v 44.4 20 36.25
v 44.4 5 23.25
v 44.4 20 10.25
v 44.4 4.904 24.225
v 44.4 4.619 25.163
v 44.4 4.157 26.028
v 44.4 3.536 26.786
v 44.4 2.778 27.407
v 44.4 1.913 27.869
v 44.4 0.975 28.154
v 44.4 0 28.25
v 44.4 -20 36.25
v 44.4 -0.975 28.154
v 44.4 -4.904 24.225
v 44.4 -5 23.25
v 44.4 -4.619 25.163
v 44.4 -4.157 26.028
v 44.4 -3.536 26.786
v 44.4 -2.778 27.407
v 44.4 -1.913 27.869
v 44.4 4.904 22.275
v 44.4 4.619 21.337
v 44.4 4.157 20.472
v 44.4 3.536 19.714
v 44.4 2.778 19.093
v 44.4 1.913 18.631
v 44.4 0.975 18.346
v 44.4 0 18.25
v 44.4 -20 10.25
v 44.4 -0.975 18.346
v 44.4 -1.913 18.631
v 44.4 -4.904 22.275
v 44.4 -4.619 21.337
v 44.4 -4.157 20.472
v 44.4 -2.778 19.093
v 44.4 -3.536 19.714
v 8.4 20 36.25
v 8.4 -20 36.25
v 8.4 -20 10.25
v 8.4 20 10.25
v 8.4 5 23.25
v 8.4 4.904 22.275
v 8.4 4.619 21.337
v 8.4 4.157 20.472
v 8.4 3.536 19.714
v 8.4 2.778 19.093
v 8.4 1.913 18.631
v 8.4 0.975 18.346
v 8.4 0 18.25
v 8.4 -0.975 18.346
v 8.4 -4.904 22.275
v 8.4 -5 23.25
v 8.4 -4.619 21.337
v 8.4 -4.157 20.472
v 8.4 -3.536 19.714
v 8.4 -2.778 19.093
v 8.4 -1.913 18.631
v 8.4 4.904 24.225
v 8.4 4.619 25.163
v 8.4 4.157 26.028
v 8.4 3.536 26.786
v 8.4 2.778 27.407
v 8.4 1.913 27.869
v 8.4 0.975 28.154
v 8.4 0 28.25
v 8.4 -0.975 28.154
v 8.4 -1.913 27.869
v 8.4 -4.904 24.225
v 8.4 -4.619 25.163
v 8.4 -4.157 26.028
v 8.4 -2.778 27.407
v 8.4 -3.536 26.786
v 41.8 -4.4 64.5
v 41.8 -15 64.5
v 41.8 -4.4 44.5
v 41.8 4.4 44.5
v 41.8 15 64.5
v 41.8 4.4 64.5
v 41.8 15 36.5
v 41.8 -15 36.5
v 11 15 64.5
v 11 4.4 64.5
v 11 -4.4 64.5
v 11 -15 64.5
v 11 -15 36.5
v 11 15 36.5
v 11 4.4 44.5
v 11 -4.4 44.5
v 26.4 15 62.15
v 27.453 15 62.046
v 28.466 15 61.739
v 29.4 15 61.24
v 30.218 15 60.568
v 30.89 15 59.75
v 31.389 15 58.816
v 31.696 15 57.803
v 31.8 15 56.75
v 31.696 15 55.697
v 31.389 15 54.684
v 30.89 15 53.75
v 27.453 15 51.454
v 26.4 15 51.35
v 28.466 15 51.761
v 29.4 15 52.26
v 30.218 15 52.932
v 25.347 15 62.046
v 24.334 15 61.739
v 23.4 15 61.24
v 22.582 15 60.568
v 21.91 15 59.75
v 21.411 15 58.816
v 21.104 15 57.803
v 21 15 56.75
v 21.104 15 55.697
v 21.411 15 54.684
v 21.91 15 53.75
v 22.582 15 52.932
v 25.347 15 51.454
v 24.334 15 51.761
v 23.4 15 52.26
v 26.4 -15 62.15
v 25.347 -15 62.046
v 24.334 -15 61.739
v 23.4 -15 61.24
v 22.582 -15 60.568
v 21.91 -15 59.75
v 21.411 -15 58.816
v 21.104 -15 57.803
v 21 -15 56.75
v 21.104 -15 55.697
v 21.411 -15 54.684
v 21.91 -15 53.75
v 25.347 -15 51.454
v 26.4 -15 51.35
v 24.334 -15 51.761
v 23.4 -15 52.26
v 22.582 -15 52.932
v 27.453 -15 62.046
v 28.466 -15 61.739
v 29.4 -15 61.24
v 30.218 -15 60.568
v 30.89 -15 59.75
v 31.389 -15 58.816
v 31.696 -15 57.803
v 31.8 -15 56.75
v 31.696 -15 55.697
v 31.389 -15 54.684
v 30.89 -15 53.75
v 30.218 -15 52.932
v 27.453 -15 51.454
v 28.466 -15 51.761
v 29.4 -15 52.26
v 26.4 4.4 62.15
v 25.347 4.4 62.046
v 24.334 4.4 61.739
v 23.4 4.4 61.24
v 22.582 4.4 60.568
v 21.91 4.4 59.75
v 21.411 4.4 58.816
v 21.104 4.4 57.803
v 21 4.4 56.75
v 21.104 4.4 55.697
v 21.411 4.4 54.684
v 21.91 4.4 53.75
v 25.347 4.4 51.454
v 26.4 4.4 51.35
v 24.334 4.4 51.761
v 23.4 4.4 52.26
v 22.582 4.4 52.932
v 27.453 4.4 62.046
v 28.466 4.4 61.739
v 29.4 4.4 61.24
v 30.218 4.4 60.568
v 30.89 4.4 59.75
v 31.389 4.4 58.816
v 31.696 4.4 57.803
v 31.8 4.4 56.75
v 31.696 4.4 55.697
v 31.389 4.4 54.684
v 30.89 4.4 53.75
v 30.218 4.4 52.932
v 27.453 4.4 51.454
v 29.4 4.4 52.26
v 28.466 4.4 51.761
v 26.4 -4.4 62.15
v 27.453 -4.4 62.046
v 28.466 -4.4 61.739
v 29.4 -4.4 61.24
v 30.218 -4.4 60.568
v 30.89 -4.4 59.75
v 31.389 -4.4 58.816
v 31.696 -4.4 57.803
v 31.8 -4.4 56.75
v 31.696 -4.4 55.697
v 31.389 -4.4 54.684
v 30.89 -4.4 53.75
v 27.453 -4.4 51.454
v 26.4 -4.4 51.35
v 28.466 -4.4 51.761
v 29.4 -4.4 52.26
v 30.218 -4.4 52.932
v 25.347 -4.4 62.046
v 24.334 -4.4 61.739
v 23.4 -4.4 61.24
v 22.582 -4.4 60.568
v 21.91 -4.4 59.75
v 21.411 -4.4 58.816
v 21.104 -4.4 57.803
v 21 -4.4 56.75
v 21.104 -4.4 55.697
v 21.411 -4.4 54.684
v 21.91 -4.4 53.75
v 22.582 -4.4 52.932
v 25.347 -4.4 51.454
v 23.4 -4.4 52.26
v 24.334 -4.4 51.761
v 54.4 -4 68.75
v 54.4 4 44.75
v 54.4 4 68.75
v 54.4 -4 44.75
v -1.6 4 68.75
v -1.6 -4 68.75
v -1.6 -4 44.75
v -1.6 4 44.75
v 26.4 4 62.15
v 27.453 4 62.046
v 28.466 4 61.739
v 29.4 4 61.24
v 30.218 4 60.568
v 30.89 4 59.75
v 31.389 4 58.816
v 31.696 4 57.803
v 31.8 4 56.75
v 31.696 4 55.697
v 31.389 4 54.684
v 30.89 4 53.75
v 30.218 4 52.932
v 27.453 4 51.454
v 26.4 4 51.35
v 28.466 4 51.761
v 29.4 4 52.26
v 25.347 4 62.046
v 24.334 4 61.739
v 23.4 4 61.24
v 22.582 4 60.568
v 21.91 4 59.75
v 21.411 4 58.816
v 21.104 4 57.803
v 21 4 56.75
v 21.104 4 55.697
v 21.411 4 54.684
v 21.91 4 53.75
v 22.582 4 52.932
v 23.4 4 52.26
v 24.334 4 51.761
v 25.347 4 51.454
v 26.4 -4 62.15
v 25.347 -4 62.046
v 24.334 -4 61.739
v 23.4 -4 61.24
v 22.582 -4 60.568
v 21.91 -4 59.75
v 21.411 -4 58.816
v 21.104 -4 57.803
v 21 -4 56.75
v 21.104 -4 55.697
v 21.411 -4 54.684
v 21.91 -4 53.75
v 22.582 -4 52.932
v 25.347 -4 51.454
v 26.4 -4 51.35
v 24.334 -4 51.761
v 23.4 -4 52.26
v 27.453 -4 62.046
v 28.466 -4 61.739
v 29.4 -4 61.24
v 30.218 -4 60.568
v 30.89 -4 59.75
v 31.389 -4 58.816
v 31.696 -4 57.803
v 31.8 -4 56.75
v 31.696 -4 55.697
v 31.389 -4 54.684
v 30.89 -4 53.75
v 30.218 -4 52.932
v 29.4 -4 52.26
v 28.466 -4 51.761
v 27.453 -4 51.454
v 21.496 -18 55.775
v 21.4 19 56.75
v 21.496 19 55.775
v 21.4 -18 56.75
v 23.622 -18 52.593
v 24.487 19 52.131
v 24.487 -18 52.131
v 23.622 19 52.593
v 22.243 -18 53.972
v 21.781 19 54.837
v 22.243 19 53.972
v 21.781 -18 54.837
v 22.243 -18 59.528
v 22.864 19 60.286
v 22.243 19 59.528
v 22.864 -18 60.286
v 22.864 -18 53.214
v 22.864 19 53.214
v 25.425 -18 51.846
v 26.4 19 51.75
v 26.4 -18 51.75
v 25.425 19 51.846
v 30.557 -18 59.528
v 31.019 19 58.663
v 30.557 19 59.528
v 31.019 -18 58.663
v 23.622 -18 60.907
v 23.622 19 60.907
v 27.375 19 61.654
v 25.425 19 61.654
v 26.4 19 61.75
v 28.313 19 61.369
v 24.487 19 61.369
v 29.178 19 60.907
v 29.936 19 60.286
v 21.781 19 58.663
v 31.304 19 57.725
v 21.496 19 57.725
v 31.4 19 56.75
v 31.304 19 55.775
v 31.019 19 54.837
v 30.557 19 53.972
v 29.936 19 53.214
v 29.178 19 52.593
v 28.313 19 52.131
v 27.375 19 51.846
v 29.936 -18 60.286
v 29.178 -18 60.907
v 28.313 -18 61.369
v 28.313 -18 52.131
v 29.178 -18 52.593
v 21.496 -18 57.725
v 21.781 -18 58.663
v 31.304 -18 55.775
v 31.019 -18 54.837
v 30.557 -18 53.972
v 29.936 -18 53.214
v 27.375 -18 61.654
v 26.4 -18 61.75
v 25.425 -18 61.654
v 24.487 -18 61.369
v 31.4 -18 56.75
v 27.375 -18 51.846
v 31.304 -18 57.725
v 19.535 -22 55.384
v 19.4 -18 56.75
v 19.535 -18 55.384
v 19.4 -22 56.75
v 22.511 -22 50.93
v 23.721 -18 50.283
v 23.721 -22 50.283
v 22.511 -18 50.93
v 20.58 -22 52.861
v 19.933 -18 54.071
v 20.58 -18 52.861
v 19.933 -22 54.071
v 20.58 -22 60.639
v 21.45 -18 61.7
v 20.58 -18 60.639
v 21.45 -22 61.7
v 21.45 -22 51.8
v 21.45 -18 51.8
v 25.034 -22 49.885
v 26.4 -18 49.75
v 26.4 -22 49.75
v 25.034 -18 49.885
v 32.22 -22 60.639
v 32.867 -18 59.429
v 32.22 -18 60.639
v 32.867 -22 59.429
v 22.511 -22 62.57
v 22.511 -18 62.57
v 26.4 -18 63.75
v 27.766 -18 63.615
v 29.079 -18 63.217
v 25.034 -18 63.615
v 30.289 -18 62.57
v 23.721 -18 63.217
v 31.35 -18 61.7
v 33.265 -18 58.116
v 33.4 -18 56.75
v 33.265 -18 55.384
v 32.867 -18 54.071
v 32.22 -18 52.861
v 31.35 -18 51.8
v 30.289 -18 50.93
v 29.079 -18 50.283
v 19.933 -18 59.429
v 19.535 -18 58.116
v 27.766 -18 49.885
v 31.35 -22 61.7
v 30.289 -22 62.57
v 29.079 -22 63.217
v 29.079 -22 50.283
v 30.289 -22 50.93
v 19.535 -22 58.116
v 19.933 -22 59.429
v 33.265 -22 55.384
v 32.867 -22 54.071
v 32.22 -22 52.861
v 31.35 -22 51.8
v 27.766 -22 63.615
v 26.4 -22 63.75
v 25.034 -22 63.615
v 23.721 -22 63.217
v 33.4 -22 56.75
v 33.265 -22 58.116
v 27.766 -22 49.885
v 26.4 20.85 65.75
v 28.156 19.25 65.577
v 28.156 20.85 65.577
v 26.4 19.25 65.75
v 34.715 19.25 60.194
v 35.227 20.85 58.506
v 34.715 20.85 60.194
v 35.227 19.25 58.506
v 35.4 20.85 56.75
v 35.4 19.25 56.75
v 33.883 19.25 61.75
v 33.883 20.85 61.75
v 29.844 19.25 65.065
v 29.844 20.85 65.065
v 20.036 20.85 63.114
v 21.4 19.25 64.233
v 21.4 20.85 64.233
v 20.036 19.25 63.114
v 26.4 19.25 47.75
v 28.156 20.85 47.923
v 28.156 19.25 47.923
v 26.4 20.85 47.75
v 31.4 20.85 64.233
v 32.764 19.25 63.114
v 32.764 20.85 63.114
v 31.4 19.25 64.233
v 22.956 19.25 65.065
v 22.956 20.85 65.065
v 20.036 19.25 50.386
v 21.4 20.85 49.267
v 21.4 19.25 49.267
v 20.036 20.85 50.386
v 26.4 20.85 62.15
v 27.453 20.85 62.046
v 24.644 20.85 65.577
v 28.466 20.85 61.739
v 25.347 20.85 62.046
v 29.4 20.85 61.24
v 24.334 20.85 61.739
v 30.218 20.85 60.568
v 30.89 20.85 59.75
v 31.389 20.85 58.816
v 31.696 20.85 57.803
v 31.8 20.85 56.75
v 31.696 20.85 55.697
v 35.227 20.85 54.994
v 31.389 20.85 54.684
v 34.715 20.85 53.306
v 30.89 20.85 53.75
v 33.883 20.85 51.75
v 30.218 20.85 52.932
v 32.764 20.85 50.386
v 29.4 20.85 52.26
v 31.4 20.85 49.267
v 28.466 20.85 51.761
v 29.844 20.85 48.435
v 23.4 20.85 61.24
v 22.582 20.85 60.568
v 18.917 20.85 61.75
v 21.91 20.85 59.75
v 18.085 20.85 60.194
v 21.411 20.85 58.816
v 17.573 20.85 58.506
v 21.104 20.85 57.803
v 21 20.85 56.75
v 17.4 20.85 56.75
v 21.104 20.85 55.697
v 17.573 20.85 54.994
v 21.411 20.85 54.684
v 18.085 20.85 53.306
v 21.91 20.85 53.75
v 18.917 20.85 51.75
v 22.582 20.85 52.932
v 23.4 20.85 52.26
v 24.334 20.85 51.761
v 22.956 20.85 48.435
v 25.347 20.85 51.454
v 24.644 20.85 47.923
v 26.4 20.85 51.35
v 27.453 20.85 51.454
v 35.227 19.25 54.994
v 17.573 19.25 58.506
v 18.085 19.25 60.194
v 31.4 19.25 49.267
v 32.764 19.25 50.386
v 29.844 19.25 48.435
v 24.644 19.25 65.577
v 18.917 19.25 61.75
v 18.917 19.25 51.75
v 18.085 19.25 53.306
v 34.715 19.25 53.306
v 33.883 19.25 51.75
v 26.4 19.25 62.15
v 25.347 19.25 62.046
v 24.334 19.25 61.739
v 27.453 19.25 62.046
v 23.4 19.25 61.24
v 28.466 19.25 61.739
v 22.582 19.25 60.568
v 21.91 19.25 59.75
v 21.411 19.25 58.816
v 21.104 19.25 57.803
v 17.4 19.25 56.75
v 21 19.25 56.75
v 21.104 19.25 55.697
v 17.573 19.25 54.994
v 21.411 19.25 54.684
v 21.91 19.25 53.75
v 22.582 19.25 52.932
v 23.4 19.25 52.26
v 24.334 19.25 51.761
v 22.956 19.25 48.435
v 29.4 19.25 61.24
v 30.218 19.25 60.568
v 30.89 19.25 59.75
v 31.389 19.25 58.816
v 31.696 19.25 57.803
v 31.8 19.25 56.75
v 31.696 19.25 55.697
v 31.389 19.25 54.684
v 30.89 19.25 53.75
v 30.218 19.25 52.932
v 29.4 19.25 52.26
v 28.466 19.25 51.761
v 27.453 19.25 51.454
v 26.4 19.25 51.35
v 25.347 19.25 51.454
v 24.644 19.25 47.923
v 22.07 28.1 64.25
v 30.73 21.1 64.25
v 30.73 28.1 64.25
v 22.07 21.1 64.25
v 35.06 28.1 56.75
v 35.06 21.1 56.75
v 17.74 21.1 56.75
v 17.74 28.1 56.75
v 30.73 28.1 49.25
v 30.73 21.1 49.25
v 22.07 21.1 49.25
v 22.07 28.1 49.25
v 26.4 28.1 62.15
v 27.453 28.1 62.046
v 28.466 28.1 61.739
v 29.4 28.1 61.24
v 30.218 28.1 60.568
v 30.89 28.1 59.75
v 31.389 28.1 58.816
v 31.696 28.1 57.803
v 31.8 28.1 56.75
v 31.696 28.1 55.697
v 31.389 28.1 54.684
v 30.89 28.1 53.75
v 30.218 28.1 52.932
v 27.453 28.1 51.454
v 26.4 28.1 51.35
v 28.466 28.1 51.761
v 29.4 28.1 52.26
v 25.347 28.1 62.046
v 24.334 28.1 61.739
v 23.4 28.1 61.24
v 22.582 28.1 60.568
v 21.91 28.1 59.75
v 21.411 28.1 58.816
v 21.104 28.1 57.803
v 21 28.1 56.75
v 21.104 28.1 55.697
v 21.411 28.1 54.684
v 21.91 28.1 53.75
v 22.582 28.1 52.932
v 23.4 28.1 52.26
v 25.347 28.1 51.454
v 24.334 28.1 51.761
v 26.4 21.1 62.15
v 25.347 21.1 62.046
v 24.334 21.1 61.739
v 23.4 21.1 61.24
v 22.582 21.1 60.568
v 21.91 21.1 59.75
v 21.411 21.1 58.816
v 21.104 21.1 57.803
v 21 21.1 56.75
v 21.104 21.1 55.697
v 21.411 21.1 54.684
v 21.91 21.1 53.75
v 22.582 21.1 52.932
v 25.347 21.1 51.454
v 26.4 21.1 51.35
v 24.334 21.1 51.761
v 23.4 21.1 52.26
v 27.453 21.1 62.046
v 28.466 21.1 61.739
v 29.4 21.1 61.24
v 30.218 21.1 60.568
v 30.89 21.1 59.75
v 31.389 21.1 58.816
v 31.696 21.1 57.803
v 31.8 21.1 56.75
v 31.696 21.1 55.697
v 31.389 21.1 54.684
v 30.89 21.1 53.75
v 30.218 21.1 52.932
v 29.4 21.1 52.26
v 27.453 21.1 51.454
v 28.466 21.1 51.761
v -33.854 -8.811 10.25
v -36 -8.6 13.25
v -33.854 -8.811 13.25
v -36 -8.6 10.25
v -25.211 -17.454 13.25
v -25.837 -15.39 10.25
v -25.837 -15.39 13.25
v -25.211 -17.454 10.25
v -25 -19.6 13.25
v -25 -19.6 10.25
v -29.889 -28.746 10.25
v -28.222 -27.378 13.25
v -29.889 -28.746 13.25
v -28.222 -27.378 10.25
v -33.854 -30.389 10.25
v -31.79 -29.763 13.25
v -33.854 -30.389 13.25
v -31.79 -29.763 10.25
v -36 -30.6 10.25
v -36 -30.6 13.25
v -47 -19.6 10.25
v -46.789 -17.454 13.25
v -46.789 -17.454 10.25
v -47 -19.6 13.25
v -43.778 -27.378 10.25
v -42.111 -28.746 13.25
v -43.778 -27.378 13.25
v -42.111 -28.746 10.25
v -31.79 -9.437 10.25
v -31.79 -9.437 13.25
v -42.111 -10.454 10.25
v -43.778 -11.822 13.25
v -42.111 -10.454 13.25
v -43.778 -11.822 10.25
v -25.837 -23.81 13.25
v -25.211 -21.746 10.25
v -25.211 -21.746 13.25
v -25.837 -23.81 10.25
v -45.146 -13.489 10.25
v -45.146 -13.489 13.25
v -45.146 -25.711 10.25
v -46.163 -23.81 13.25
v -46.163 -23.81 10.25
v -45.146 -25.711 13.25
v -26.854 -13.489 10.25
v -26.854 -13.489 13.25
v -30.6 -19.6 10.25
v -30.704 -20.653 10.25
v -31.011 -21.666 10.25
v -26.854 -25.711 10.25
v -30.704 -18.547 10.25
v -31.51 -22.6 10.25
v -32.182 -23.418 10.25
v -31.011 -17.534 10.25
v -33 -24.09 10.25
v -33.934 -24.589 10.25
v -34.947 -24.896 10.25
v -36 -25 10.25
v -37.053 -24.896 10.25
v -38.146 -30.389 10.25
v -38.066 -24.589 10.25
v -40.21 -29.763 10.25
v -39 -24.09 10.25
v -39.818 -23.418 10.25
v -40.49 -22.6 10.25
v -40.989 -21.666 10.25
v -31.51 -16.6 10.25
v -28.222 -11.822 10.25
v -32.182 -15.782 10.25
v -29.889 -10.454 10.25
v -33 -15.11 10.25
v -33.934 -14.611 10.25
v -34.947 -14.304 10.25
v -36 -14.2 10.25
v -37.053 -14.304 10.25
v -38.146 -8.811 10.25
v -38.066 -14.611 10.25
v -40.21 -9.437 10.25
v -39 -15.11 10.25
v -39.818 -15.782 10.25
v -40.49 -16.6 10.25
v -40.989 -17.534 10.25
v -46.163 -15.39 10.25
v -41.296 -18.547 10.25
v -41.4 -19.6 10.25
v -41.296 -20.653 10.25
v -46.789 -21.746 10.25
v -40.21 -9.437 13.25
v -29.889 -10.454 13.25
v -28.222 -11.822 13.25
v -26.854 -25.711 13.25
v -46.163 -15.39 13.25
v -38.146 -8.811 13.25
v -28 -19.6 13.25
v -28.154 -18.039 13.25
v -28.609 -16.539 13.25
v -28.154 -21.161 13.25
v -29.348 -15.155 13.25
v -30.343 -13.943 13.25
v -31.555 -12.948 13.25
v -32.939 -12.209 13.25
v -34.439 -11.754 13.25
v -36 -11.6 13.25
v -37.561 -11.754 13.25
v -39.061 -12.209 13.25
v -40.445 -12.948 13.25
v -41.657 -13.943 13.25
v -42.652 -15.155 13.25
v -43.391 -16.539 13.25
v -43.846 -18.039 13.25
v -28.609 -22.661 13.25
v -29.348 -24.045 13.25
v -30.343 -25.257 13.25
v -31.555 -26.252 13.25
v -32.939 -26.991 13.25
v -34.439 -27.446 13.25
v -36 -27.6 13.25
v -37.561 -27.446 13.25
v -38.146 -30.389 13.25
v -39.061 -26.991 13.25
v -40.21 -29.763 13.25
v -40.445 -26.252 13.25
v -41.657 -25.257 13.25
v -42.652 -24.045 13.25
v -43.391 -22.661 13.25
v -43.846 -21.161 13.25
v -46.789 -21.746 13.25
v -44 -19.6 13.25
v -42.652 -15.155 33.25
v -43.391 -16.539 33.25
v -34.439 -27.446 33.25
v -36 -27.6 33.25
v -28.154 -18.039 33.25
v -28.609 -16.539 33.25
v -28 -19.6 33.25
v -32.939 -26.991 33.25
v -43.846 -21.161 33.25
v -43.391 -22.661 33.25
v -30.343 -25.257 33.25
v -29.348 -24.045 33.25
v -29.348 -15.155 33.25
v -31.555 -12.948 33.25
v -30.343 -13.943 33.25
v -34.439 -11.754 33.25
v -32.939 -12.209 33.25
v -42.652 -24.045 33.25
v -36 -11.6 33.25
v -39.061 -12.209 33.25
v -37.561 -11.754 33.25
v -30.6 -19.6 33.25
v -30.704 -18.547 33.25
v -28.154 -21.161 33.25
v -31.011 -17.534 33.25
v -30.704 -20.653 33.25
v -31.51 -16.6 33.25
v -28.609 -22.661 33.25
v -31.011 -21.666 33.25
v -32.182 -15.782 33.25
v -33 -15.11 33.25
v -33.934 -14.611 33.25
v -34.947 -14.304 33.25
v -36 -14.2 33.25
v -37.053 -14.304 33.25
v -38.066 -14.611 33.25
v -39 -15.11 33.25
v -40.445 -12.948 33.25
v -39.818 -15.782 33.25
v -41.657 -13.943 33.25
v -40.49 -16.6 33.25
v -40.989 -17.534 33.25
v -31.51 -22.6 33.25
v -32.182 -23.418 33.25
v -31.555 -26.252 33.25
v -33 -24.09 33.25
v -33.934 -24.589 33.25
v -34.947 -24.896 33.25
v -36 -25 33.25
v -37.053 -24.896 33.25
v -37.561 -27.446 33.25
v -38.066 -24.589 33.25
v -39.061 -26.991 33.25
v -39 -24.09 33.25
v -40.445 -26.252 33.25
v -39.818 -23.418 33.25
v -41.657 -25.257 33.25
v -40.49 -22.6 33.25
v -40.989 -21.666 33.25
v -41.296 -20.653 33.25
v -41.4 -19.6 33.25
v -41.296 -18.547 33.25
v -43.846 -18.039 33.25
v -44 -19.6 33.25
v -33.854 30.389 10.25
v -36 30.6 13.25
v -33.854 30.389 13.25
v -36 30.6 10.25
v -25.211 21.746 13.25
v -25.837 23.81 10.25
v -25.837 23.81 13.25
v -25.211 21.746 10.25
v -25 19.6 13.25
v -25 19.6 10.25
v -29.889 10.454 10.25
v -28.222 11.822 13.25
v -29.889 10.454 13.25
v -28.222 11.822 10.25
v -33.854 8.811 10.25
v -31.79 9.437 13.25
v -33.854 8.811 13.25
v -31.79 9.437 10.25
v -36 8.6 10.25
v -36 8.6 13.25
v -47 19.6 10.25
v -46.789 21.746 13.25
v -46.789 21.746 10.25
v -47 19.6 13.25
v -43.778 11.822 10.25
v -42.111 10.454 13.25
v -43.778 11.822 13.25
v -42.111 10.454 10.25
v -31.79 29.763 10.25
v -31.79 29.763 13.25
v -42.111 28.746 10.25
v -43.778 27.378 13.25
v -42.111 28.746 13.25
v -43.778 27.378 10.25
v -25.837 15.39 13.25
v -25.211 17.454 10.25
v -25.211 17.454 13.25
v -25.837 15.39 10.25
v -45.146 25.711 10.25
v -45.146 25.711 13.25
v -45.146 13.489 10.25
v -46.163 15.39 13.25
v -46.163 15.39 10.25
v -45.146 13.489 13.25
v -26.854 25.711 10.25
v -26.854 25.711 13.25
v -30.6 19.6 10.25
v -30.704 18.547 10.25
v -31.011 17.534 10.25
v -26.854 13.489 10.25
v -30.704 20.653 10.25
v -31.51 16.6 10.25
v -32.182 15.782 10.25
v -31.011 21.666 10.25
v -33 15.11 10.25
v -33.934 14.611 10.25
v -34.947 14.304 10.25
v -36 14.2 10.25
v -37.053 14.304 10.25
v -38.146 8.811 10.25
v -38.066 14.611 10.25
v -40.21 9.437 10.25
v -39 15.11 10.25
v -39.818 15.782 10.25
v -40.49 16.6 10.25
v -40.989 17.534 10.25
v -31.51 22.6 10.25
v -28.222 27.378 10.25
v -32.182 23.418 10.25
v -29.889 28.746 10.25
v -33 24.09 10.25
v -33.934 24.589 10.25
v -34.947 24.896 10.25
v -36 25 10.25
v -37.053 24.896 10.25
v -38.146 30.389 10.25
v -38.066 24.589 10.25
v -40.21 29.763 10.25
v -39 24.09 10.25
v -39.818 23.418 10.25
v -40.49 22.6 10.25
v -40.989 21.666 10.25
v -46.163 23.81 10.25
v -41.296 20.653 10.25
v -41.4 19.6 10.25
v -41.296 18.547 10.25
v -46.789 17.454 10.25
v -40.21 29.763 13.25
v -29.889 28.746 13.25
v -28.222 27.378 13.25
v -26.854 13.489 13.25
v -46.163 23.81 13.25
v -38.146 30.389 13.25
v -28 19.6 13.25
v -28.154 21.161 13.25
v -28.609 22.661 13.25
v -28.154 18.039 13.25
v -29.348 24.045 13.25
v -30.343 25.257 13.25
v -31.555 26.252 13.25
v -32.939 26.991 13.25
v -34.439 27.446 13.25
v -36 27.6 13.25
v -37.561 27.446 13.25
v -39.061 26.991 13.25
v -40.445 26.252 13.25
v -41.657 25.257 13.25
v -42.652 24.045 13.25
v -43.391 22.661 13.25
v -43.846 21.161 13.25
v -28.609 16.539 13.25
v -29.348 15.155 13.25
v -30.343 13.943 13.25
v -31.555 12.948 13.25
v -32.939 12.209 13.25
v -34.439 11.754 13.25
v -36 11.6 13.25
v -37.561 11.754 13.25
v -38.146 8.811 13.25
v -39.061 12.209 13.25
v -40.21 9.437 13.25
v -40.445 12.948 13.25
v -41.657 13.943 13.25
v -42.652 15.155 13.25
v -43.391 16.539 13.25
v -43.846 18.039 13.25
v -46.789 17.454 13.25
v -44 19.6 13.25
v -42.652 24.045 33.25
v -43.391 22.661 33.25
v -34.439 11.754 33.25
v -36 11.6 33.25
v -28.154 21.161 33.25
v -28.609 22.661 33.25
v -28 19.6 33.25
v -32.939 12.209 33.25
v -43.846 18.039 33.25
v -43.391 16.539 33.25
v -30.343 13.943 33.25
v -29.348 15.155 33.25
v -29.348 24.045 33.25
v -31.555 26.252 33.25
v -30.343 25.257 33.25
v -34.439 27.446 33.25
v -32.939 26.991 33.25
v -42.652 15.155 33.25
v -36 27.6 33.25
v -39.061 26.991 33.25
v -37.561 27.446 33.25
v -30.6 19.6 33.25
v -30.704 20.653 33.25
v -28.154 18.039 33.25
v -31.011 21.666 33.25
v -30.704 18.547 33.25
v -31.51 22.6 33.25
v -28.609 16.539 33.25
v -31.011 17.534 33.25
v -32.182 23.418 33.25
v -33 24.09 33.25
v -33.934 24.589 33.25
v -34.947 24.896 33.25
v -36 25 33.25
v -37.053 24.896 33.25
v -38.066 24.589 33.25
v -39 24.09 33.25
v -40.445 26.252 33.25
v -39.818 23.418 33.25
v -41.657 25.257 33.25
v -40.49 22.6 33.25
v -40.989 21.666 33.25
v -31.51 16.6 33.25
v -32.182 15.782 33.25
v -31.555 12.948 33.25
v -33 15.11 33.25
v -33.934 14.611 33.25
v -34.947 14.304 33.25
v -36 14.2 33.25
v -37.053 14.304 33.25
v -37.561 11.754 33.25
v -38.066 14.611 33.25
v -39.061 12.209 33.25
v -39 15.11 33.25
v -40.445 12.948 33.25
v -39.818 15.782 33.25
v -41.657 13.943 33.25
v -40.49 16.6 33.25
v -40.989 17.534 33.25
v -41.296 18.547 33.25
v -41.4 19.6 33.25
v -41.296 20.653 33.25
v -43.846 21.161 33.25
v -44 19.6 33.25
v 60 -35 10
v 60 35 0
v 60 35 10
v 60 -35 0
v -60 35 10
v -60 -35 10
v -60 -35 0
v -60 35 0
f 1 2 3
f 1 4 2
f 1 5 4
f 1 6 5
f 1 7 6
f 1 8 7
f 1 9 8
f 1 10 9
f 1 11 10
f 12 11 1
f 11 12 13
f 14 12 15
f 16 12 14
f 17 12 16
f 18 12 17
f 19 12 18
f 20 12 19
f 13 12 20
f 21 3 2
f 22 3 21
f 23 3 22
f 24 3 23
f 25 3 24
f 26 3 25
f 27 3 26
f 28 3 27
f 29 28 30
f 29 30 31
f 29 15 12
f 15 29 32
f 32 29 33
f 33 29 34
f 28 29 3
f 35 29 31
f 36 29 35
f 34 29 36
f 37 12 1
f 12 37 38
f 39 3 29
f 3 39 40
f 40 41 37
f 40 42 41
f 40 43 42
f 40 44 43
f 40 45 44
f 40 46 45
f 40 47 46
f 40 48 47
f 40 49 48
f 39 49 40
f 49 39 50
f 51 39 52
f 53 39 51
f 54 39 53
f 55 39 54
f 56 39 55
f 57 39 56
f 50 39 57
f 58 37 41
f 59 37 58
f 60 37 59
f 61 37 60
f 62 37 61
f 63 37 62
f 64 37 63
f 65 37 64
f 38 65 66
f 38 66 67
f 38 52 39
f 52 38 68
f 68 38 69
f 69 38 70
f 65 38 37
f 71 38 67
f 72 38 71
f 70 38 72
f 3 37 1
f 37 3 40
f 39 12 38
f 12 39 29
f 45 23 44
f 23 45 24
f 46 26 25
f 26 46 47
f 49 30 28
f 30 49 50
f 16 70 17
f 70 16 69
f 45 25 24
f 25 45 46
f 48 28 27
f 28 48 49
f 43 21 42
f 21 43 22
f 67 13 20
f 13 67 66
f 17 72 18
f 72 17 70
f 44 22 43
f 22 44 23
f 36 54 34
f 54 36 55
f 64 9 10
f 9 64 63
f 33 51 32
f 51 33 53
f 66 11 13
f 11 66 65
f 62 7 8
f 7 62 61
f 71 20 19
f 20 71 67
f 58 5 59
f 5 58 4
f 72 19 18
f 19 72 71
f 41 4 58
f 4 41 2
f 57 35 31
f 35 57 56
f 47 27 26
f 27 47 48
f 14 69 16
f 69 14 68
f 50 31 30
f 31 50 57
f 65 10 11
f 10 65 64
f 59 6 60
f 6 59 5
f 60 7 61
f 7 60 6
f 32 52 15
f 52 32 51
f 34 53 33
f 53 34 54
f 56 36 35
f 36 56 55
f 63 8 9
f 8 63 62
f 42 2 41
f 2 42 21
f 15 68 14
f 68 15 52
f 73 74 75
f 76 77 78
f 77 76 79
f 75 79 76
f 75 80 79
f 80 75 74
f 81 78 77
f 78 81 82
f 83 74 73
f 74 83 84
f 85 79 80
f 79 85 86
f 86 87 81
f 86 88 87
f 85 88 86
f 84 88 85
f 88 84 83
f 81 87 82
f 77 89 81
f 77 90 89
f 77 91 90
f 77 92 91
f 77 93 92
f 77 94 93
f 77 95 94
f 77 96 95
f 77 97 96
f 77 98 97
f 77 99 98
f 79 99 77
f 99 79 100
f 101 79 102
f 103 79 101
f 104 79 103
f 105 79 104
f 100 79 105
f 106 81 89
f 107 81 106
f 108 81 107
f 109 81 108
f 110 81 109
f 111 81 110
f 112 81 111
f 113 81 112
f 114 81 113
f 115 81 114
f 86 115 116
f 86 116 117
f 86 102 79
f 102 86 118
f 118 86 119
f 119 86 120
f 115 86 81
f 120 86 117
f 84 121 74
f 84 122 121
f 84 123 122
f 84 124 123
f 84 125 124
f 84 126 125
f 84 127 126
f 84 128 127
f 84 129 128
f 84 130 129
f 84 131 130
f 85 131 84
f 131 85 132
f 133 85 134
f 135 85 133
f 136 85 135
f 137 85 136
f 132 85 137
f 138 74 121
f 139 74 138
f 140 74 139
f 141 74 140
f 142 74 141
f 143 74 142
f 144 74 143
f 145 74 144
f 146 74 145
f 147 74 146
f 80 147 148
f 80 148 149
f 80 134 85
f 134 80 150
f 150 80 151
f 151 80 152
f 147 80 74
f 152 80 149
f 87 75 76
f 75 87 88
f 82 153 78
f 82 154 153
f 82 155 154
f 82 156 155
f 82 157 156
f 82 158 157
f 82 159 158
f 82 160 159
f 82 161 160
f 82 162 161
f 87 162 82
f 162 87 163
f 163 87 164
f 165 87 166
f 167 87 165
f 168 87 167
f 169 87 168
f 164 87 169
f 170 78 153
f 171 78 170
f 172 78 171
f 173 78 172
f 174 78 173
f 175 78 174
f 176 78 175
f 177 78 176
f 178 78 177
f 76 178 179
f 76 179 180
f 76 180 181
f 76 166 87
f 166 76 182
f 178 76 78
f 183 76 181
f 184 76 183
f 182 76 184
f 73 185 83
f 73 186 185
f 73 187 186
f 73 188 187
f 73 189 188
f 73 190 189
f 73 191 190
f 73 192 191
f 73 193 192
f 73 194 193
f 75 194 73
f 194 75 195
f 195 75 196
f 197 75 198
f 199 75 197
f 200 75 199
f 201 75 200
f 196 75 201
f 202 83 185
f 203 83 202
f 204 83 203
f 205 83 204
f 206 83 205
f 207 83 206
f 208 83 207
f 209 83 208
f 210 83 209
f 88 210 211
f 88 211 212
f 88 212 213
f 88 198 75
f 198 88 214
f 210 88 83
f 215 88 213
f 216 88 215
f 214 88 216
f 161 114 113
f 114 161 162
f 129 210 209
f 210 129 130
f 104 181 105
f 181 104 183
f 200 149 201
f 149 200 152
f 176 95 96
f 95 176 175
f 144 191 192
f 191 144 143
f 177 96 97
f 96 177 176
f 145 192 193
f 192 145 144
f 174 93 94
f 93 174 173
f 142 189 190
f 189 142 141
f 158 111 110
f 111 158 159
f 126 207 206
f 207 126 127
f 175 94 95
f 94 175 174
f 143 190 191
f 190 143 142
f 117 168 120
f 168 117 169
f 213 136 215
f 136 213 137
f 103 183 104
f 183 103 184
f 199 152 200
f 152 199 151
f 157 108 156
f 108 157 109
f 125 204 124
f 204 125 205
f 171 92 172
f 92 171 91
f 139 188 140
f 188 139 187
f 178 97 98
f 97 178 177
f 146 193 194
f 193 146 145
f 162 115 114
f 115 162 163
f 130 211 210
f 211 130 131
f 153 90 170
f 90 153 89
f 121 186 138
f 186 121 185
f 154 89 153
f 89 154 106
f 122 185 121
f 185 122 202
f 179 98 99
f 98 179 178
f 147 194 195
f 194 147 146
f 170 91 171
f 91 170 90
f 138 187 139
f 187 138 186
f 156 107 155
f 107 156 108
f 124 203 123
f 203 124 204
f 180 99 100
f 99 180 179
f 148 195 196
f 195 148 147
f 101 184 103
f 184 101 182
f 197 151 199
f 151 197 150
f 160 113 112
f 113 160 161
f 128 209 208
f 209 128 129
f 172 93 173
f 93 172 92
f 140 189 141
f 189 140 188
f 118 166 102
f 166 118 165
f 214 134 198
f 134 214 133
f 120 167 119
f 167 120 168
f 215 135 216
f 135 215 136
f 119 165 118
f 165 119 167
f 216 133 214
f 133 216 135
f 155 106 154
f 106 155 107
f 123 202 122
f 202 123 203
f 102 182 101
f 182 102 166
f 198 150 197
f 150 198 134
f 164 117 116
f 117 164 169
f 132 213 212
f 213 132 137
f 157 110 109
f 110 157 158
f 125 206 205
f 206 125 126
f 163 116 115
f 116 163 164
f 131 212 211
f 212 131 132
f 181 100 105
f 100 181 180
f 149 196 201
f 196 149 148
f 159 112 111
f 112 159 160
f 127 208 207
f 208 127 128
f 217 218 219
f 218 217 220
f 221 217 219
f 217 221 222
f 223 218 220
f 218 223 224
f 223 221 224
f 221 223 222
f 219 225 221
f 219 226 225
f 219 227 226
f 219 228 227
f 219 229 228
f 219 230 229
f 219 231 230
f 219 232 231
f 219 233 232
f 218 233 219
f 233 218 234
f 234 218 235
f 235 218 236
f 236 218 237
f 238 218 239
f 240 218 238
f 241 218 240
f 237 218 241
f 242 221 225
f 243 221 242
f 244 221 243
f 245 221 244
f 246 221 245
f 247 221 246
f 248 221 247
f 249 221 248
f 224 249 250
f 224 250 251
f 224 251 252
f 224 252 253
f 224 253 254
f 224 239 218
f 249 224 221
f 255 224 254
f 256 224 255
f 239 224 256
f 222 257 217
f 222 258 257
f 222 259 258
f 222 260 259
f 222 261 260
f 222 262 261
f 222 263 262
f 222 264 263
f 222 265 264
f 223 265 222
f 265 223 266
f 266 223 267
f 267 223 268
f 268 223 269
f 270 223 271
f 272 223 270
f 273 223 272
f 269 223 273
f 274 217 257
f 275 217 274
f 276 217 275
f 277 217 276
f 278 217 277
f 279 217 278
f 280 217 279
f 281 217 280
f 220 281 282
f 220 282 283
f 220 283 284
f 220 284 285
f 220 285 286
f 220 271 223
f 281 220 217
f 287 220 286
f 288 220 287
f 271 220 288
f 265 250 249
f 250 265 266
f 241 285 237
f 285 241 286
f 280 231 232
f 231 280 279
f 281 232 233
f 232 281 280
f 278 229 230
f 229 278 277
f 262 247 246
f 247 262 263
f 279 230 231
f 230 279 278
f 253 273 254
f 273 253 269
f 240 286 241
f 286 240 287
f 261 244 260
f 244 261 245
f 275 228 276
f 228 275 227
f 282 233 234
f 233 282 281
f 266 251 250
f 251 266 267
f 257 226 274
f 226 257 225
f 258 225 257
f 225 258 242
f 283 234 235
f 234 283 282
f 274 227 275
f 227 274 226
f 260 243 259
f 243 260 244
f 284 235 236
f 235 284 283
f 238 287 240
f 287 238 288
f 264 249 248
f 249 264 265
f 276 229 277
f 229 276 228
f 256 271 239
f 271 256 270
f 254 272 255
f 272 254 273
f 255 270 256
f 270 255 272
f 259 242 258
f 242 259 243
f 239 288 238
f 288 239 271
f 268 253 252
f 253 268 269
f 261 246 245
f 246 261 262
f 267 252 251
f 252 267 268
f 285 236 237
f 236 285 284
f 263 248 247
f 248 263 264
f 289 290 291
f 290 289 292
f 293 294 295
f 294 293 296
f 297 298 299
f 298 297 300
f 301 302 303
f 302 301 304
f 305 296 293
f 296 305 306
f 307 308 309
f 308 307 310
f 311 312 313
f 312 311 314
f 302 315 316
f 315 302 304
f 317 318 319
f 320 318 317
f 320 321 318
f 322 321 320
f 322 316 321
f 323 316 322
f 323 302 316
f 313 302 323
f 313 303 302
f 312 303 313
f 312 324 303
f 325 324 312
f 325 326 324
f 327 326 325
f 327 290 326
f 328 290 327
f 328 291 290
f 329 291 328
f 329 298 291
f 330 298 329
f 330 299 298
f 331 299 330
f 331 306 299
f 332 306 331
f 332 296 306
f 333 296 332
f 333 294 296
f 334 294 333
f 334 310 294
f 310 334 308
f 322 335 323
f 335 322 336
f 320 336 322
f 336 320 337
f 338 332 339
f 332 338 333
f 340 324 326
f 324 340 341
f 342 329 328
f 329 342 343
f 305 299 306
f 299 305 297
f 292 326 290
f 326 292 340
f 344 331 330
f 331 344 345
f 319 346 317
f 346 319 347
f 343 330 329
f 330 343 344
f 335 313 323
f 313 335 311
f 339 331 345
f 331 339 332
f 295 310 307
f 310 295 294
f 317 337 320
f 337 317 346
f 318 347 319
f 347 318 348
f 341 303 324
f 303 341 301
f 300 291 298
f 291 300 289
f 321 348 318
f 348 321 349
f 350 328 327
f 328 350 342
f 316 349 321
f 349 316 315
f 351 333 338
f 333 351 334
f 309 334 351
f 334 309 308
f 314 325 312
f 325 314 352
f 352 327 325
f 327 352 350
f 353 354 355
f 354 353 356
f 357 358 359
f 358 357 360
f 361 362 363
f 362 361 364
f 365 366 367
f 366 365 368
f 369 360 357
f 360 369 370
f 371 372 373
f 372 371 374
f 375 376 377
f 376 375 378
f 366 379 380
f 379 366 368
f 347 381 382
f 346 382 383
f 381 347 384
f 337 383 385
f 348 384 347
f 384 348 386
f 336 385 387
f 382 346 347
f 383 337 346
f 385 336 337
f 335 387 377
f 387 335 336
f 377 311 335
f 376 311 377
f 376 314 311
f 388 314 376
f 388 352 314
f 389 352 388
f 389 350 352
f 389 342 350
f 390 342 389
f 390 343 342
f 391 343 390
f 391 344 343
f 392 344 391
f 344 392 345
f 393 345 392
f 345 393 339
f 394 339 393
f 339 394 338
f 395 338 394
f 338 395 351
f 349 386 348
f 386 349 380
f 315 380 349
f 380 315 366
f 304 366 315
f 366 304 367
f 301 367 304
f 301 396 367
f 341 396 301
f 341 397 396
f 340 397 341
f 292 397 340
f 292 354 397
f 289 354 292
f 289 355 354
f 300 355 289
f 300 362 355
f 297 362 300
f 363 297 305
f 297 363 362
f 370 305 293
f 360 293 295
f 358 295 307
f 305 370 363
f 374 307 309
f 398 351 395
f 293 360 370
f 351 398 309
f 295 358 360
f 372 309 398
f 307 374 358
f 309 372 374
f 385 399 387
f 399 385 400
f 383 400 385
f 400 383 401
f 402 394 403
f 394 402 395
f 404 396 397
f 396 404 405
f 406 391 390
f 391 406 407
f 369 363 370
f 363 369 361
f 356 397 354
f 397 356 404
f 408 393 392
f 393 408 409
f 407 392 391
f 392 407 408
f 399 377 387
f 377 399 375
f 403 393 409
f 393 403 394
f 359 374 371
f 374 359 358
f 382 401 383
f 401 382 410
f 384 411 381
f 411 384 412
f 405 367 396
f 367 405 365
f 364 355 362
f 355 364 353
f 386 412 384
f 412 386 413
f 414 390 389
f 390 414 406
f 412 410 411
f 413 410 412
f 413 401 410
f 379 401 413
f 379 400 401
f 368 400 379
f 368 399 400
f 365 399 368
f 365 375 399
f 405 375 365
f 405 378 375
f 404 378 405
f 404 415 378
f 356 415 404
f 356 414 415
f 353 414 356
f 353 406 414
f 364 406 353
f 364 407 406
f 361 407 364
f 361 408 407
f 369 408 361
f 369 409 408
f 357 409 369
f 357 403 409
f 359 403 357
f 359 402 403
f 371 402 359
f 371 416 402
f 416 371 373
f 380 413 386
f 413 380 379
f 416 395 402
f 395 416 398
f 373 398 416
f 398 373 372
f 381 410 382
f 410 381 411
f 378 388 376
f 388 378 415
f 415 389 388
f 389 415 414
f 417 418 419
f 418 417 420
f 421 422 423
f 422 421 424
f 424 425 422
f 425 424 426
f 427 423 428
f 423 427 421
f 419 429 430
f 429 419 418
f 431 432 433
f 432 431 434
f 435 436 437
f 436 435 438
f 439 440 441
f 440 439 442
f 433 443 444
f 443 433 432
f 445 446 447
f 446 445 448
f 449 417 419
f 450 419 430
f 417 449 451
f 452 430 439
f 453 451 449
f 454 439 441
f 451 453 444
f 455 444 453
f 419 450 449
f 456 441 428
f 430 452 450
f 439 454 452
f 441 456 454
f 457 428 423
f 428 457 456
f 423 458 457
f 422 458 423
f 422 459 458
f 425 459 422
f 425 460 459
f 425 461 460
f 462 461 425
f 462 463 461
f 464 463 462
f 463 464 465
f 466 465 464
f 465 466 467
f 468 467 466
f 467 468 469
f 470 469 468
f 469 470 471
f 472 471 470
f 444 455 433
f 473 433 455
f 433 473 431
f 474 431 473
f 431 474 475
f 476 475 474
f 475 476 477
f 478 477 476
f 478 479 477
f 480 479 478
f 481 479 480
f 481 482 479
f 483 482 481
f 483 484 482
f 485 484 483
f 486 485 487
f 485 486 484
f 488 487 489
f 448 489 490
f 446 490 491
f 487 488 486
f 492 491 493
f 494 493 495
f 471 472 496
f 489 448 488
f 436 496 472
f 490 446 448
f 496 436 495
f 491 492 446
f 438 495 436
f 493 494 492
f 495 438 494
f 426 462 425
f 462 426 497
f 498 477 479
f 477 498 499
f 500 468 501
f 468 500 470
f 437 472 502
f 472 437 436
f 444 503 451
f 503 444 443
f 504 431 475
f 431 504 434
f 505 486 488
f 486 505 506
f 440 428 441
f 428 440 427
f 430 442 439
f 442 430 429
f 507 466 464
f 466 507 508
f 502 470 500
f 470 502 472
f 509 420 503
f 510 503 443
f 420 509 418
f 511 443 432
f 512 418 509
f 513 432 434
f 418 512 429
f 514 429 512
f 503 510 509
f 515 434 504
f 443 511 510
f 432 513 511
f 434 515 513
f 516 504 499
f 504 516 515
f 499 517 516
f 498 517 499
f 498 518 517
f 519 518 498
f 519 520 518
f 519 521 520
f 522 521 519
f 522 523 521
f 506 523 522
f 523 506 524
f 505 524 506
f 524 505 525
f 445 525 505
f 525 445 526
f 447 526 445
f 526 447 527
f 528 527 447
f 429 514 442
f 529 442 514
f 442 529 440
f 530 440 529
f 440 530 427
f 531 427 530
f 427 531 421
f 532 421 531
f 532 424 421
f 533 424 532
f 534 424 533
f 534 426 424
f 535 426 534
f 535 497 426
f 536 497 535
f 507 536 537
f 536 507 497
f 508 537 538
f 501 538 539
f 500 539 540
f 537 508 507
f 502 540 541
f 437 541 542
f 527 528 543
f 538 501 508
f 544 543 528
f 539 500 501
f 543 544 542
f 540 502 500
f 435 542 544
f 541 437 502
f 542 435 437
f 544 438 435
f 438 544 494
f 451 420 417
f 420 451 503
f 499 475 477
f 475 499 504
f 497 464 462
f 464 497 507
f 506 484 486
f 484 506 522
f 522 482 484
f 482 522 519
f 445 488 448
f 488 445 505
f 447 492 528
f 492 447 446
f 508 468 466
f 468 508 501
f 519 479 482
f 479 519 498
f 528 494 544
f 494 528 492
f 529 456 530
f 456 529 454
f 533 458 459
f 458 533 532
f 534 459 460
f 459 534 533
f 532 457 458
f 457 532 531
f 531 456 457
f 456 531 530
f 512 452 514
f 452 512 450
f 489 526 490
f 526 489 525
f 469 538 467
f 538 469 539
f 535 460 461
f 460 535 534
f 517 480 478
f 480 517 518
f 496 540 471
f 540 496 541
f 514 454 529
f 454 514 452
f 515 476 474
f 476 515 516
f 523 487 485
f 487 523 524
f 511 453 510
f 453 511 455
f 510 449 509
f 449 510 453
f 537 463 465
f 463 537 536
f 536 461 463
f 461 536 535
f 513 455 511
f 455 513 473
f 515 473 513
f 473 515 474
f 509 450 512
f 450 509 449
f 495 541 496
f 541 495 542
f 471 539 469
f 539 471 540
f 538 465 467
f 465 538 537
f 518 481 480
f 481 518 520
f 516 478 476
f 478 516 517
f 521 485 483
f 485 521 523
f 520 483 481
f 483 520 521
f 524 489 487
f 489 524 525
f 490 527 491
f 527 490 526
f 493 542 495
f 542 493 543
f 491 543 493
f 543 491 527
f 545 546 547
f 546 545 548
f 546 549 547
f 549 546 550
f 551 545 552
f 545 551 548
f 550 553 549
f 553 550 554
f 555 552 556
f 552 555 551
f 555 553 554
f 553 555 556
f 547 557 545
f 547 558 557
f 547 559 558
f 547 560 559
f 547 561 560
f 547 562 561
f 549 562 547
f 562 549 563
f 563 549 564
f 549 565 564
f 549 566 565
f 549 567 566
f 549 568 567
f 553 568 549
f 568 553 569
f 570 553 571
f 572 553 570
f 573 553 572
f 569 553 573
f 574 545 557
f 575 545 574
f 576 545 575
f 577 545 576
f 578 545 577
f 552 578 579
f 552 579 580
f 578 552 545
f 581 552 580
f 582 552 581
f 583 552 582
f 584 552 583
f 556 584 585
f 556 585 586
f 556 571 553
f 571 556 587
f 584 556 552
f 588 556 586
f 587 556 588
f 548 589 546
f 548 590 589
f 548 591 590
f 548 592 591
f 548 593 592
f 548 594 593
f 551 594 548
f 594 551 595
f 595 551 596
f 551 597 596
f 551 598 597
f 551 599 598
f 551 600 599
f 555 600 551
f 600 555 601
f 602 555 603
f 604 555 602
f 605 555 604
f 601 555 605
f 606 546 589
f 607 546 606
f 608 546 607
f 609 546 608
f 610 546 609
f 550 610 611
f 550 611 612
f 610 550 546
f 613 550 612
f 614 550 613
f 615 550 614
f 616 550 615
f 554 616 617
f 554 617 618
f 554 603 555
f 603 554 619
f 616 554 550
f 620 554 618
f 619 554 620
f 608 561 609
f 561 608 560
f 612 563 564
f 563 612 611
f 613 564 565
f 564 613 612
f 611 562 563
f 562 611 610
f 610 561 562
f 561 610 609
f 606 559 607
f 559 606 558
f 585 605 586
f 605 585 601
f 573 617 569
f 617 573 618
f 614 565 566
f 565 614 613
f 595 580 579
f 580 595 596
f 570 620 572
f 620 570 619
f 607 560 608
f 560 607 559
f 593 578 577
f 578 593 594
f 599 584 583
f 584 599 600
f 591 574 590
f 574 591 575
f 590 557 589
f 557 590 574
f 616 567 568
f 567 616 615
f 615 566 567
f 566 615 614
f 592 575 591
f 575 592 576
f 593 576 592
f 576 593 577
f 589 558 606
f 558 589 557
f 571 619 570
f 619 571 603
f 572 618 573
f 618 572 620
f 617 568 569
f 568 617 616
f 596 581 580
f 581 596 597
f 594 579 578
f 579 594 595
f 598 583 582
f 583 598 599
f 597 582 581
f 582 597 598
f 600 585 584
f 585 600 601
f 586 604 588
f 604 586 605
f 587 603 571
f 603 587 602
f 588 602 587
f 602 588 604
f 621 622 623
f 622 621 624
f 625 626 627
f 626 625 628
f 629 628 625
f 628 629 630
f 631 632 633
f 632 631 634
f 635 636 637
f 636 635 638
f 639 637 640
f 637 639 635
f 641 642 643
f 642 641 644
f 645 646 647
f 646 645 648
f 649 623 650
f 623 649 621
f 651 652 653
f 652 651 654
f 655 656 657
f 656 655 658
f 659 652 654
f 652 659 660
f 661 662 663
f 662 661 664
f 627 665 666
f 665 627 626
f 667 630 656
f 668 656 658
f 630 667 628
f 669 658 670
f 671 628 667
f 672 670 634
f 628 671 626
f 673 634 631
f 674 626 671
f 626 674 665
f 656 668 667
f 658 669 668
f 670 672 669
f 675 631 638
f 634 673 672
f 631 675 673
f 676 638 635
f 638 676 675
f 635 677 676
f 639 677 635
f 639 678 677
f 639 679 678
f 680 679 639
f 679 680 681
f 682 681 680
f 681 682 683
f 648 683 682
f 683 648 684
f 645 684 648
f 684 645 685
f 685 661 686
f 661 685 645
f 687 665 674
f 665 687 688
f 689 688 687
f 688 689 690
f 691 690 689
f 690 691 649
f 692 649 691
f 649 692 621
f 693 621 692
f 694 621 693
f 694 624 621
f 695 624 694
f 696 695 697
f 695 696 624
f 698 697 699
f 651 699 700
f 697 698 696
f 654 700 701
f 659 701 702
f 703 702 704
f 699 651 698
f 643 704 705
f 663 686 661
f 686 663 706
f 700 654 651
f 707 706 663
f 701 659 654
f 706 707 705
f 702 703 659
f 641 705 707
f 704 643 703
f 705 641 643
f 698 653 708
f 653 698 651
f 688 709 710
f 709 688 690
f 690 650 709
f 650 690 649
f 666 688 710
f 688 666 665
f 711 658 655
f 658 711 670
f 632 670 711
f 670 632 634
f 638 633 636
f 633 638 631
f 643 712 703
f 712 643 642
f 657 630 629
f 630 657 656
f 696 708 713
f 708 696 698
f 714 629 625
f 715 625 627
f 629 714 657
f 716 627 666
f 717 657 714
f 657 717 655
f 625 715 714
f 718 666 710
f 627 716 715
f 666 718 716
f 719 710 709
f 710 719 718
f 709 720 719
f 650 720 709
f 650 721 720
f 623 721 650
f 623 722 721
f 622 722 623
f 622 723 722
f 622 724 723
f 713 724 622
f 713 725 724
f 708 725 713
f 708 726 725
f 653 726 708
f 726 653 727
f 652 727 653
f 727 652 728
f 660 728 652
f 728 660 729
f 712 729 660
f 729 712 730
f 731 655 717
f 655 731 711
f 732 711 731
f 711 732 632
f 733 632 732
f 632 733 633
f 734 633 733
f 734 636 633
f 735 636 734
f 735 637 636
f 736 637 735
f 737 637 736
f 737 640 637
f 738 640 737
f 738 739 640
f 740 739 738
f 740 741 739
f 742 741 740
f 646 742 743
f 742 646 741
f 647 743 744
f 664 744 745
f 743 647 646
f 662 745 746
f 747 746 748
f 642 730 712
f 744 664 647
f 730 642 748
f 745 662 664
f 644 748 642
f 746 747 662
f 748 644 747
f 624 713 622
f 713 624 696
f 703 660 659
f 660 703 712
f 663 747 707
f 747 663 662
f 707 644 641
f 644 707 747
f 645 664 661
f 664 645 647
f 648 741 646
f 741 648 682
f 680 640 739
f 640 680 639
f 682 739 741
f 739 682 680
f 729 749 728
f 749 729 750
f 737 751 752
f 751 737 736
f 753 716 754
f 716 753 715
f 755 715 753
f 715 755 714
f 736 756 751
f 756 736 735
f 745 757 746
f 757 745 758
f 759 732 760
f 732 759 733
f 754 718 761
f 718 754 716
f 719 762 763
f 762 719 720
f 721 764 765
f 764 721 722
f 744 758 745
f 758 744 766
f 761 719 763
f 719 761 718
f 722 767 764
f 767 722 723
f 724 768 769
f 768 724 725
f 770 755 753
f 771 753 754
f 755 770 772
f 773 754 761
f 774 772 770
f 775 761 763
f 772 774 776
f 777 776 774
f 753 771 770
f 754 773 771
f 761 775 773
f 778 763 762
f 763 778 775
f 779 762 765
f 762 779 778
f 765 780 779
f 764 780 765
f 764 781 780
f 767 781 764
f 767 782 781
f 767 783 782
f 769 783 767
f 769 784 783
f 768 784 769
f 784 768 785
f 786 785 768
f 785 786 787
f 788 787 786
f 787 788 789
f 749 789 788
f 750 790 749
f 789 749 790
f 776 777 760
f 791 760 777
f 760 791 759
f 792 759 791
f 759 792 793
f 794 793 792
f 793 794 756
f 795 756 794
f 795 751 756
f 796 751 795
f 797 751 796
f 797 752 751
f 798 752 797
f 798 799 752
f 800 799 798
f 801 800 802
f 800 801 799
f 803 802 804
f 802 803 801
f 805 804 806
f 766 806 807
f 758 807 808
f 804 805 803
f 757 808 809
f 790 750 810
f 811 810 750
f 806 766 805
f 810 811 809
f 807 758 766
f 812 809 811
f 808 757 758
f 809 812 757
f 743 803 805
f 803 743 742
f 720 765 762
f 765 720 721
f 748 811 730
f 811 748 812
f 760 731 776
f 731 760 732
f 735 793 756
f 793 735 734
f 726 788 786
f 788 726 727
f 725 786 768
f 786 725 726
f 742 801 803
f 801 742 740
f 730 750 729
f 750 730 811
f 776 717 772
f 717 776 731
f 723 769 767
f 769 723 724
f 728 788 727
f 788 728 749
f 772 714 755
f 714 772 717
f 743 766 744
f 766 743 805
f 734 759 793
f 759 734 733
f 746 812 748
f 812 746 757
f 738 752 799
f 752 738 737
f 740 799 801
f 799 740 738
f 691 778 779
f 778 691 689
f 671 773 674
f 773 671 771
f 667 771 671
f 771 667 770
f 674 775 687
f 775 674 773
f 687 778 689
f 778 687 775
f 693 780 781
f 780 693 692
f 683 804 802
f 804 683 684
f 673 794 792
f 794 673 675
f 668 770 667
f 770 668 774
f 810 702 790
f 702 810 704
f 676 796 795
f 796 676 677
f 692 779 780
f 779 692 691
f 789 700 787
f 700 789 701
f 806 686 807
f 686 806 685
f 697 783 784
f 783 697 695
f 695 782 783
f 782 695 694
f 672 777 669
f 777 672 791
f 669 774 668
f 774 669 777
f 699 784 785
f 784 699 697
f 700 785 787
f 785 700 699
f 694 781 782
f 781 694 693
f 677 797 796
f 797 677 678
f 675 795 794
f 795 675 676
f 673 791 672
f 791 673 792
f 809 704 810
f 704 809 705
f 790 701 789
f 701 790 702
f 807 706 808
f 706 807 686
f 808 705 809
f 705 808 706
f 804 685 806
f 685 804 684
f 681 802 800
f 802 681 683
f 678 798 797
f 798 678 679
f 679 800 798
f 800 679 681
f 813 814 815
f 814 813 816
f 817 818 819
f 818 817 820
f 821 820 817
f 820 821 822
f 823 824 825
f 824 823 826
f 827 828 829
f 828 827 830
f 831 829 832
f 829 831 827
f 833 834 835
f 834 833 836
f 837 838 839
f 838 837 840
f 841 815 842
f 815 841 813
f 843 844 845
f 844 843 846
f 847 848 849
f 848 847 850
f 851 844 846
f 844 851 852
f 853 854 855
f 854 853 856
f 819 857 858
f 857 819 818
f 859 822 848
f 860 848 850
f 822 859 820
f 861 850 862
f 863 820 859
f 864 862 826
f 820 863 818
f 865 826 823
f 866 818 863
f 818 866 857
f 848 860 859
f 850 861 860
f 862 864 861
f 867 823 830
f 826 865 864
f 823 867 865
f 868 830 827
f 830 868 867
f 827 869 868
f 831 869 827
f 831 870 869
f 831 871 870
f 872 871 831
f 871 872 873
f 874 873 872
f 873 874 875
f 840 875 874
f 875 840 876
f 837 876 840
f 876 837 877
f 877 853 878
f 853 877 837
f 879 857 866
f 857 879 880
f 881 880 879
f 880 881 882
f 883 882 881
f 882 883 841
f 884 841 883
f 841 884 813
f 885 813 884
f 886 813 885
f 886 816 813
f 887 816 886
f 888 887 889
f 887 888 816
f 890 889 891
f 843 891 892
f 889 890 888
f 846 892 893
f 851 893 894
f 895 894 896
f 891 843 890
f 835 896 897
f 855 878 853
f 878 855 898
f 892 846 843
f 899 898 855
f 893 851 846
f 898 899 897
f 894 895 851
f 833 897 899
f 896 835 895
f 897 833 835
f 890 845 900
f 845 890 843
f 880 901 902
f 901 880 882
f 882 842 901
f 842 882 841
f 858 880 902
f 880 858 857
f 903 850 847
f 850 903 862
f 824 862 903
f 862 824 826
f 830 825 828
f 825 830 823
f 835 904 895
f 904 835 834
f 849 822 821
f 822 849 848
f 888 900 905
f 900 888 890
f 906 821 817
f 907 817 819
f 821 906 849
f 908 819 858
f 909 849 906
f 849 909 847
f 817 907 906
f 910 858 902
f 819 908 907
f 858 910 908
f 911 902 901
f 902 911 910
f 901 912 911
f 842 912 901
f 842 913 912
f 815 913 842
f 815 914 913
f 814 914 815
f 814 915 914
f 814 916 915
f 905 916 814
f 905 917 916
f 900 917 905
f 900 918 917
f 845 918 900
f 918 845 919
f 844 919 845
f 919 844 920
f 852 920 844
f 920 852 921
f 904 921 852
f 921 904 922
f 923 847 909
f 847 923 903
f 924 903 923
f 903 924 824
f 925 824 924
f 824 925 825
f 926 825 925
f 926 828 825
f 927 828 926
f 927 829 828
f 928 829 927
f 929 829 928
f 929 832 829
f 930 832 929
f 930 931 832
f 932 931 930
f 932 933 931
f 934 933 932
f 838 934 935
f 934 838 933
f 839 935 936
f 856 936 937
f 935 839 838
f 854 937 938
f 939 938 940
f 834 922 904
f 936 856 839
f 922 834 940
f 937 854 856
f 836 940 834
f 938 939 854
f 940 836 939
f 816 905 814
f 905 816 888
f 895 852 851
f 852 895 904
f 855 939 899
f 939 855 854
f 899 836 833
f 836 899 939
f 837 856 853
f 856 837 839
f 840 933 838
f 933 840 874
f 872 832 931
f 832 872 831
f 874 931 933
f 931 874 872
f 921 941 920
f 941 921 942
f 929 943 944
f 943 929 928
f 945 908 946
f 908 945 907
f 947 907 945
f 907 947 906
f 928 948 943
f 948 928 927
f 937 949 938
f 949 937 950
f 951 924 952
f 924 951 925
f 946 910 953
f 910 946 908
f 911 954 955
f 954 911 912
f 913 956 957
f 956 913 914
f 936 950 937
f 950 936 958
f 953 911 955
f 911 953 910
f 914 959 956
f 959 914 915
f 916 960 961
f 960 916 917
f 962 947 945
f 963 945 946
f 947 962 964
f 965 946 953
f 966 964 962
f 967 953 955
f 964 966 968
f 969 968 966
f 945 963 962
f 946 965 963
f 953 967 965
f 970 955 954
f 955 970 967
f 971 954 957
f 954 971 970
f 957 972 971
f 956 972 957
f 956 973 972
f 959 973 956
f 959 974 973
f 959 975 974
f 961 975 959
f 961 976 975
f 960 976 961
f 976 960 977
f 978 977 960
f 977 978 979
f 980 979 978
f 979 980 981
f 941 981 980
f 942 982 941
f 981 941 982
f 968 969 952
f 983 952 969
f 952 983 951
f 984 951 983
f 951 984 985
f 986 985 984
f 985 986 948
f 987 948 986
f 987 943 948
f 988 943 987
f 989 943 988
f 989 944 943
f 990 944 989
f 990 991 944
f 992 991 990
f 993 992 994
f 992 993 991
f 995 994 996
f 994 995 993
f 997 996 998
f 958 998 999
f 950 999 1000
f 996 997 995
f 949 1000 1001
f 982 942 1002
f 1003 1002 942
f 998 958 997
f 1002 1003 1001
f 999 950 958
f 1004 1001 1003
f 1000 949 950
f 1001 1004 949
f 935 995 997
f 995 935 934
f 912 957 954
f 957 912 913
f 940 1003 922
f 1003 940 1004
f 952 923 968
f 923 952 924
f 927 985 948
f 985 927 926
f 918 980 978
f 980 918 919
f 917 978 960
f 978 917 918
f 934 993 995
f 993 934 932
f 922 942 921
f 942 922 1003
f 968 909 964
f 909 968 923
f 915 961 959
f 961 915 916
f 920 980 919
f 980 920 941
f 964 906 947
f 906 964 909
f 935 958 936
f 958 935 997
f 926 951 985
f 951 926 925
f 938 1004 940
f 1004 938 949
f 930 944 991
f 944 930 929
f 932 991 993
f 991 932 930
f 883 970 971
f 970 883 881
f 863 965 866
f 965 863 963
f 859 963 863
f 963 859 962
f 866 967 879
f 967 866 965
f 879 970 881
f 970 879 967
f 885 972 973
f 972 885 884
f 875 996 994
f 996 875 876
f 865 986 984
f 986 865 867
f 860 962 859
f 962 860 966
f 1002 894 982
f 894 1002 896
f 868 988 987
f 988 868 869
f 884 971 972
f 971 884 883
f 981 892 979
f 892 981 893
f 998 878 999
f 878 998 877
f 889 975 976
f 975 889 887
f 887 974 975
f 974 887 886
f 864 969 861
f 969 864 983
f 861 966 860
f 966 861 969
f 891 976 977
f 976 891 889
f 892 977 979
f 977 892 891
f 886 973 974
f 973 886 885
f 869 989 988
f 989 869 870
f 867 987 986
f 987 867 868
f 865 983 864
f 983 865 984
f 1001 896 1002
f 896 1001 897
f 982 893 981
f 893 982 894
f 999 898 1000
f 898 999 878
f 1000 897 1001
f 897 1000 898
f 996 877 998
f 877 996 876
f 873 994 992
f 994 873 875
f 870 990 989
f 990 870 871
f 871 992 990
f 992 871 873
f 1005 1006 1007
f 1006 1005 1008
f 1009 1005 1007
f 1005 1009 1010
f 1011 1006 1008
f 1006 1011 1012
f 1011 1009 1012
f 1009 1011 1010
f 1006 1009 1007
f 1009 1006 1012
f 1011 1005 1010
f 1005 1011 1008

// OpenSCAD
$fn = 32;

// ------------------------------------------------------------------------
// Indexing jig: plate 120 x 70 mm, pin d10
// Every part is its own module, assembly() places every instance.
// ------------------------------------------------------------------------

// --- part 1 ---
module jig_plate() {
  difference() {
    translate([-60, -35, 0]) cube([120, 70, 10]);
  }
}

// --- part 2 ---
module locator_block() {
  difference() {
    translate([-18, -20, 0]) cube([36, 40, 26]);
    translate([0, 0, 13]) rotate([0, 90, 0]) cylinder(h = 38, d = 10, center = true);
  }
}

// --- part 3 ---
module index_fork() {
  difference() {
    translate([-15.4, -15, 0]) cube([30.8, 30, 28]);
    translate([-16.4, -4.4, 8]) cube([32.8, 8.8, 21]);
    translate([0, 0, 20.25]) rotate([90, 0, 0]) cylinder(h = 32, d = 10.8, center = true);
  }
}

// --- part 4 ---
module index_arm() {
  difference() {
    translate([-28, -4, 0]) cube([56, 8, 24]);
    translate([0, 0, 12]) rotate([90, 0, 0]) cylinder(h = 10, d = 10.8, center = true);
  }
}

// --- part 5 ---
module index_pin() {
  rotate([0, 90, 0]) cylinder(h = 38, d = 10, center = true);
  translate([-22, 0, 0]) rotate([0, 90, 0]) cylinder(h = 4, d = 14);
}

// --- part 6 ---
module pin_washer() {
  difference() {
      translate([0, 0, 0]) cylinder(h = 1.6, d = 18);
      translate([0, 0, -1]) cylinder(h = 3.6, d = 10.8);
    }
}

// --- part 7 ---
module lock_nut() {
  difference() {
    linear_extrude(height = 7) polygon(points = [[8.66, 0], [4.33, 7.5], [-4.33, 7.5], [-8.66, 0], [-4.33, -7.5], [4.33, -7.5]]);
    translate([0, 0, -1]) cylinder(h = 9, d = 10.8);
  }
}

// --- part 8 ---
module guide_bush_a() {
  difference() {
    union() {
      cylinder(h = 3, d = 22);
      translate([0, 0, 3]) cylinder(h = 20, d = 16);
    }
    translate([0, 0, -1]) cylinder(h = 25, d = 10.8);
  }
}

// --- part 9 ---
module guide_bush_b() {
  difference() {
    union() {
      cylinder(h = 3, d = 22);
      translate([0, 0, 3]) cylinder(h = 20, d = 16);
    }
    translate([0, 0, -1]) cylinder(h = 25, d = 10.8);
  }
}

// --- assembly ---
module assembly() {
  color([0.80, 0.24, 0.20]) translate([0, 0, 0]) rotate([0, 0, 0]) jig_plate();
  color([0.20, 0.45, 0.75]) translate([26.4, 0, 10.25]) rotate([0, 0, 0]) locator_block();
  color([0.25, 0.62, 0.32]) translate([26.4, 0, 36.5]) rotate([0, 0, 0]) index_fork();
  color([0.92, 0.70, 0.18]) translate([26.4, 0, 44.75]) rotate([0, 0, 0]) index_arm();
  color([0.58, 0.35, 0.70]) translate([26.4, 0, 56.75]) rotate([0, 0, 90]) index_pin();
  color([0.16, 0.66, 0.66]) translate([26.4, 20.85, 56.75]) rotate([90, 0, 0]) pin_washer();
  color([0.85, 0.48, 0.18]) translate([26.4, 28.1, 56.75]) rotate([90, 0, 0]) lock_nut();
  color([0.55, 0.60, 0.65]) translate([-36, -19.6, 10.25]) rotate([0, 0, 0]) guide_bush_a();
  color([0.75, 0.30, 0.55]) translate([-36, 19.6, 10.25]) rotate([0, 0, 0]) guide_bush_b();
}

assembly();
